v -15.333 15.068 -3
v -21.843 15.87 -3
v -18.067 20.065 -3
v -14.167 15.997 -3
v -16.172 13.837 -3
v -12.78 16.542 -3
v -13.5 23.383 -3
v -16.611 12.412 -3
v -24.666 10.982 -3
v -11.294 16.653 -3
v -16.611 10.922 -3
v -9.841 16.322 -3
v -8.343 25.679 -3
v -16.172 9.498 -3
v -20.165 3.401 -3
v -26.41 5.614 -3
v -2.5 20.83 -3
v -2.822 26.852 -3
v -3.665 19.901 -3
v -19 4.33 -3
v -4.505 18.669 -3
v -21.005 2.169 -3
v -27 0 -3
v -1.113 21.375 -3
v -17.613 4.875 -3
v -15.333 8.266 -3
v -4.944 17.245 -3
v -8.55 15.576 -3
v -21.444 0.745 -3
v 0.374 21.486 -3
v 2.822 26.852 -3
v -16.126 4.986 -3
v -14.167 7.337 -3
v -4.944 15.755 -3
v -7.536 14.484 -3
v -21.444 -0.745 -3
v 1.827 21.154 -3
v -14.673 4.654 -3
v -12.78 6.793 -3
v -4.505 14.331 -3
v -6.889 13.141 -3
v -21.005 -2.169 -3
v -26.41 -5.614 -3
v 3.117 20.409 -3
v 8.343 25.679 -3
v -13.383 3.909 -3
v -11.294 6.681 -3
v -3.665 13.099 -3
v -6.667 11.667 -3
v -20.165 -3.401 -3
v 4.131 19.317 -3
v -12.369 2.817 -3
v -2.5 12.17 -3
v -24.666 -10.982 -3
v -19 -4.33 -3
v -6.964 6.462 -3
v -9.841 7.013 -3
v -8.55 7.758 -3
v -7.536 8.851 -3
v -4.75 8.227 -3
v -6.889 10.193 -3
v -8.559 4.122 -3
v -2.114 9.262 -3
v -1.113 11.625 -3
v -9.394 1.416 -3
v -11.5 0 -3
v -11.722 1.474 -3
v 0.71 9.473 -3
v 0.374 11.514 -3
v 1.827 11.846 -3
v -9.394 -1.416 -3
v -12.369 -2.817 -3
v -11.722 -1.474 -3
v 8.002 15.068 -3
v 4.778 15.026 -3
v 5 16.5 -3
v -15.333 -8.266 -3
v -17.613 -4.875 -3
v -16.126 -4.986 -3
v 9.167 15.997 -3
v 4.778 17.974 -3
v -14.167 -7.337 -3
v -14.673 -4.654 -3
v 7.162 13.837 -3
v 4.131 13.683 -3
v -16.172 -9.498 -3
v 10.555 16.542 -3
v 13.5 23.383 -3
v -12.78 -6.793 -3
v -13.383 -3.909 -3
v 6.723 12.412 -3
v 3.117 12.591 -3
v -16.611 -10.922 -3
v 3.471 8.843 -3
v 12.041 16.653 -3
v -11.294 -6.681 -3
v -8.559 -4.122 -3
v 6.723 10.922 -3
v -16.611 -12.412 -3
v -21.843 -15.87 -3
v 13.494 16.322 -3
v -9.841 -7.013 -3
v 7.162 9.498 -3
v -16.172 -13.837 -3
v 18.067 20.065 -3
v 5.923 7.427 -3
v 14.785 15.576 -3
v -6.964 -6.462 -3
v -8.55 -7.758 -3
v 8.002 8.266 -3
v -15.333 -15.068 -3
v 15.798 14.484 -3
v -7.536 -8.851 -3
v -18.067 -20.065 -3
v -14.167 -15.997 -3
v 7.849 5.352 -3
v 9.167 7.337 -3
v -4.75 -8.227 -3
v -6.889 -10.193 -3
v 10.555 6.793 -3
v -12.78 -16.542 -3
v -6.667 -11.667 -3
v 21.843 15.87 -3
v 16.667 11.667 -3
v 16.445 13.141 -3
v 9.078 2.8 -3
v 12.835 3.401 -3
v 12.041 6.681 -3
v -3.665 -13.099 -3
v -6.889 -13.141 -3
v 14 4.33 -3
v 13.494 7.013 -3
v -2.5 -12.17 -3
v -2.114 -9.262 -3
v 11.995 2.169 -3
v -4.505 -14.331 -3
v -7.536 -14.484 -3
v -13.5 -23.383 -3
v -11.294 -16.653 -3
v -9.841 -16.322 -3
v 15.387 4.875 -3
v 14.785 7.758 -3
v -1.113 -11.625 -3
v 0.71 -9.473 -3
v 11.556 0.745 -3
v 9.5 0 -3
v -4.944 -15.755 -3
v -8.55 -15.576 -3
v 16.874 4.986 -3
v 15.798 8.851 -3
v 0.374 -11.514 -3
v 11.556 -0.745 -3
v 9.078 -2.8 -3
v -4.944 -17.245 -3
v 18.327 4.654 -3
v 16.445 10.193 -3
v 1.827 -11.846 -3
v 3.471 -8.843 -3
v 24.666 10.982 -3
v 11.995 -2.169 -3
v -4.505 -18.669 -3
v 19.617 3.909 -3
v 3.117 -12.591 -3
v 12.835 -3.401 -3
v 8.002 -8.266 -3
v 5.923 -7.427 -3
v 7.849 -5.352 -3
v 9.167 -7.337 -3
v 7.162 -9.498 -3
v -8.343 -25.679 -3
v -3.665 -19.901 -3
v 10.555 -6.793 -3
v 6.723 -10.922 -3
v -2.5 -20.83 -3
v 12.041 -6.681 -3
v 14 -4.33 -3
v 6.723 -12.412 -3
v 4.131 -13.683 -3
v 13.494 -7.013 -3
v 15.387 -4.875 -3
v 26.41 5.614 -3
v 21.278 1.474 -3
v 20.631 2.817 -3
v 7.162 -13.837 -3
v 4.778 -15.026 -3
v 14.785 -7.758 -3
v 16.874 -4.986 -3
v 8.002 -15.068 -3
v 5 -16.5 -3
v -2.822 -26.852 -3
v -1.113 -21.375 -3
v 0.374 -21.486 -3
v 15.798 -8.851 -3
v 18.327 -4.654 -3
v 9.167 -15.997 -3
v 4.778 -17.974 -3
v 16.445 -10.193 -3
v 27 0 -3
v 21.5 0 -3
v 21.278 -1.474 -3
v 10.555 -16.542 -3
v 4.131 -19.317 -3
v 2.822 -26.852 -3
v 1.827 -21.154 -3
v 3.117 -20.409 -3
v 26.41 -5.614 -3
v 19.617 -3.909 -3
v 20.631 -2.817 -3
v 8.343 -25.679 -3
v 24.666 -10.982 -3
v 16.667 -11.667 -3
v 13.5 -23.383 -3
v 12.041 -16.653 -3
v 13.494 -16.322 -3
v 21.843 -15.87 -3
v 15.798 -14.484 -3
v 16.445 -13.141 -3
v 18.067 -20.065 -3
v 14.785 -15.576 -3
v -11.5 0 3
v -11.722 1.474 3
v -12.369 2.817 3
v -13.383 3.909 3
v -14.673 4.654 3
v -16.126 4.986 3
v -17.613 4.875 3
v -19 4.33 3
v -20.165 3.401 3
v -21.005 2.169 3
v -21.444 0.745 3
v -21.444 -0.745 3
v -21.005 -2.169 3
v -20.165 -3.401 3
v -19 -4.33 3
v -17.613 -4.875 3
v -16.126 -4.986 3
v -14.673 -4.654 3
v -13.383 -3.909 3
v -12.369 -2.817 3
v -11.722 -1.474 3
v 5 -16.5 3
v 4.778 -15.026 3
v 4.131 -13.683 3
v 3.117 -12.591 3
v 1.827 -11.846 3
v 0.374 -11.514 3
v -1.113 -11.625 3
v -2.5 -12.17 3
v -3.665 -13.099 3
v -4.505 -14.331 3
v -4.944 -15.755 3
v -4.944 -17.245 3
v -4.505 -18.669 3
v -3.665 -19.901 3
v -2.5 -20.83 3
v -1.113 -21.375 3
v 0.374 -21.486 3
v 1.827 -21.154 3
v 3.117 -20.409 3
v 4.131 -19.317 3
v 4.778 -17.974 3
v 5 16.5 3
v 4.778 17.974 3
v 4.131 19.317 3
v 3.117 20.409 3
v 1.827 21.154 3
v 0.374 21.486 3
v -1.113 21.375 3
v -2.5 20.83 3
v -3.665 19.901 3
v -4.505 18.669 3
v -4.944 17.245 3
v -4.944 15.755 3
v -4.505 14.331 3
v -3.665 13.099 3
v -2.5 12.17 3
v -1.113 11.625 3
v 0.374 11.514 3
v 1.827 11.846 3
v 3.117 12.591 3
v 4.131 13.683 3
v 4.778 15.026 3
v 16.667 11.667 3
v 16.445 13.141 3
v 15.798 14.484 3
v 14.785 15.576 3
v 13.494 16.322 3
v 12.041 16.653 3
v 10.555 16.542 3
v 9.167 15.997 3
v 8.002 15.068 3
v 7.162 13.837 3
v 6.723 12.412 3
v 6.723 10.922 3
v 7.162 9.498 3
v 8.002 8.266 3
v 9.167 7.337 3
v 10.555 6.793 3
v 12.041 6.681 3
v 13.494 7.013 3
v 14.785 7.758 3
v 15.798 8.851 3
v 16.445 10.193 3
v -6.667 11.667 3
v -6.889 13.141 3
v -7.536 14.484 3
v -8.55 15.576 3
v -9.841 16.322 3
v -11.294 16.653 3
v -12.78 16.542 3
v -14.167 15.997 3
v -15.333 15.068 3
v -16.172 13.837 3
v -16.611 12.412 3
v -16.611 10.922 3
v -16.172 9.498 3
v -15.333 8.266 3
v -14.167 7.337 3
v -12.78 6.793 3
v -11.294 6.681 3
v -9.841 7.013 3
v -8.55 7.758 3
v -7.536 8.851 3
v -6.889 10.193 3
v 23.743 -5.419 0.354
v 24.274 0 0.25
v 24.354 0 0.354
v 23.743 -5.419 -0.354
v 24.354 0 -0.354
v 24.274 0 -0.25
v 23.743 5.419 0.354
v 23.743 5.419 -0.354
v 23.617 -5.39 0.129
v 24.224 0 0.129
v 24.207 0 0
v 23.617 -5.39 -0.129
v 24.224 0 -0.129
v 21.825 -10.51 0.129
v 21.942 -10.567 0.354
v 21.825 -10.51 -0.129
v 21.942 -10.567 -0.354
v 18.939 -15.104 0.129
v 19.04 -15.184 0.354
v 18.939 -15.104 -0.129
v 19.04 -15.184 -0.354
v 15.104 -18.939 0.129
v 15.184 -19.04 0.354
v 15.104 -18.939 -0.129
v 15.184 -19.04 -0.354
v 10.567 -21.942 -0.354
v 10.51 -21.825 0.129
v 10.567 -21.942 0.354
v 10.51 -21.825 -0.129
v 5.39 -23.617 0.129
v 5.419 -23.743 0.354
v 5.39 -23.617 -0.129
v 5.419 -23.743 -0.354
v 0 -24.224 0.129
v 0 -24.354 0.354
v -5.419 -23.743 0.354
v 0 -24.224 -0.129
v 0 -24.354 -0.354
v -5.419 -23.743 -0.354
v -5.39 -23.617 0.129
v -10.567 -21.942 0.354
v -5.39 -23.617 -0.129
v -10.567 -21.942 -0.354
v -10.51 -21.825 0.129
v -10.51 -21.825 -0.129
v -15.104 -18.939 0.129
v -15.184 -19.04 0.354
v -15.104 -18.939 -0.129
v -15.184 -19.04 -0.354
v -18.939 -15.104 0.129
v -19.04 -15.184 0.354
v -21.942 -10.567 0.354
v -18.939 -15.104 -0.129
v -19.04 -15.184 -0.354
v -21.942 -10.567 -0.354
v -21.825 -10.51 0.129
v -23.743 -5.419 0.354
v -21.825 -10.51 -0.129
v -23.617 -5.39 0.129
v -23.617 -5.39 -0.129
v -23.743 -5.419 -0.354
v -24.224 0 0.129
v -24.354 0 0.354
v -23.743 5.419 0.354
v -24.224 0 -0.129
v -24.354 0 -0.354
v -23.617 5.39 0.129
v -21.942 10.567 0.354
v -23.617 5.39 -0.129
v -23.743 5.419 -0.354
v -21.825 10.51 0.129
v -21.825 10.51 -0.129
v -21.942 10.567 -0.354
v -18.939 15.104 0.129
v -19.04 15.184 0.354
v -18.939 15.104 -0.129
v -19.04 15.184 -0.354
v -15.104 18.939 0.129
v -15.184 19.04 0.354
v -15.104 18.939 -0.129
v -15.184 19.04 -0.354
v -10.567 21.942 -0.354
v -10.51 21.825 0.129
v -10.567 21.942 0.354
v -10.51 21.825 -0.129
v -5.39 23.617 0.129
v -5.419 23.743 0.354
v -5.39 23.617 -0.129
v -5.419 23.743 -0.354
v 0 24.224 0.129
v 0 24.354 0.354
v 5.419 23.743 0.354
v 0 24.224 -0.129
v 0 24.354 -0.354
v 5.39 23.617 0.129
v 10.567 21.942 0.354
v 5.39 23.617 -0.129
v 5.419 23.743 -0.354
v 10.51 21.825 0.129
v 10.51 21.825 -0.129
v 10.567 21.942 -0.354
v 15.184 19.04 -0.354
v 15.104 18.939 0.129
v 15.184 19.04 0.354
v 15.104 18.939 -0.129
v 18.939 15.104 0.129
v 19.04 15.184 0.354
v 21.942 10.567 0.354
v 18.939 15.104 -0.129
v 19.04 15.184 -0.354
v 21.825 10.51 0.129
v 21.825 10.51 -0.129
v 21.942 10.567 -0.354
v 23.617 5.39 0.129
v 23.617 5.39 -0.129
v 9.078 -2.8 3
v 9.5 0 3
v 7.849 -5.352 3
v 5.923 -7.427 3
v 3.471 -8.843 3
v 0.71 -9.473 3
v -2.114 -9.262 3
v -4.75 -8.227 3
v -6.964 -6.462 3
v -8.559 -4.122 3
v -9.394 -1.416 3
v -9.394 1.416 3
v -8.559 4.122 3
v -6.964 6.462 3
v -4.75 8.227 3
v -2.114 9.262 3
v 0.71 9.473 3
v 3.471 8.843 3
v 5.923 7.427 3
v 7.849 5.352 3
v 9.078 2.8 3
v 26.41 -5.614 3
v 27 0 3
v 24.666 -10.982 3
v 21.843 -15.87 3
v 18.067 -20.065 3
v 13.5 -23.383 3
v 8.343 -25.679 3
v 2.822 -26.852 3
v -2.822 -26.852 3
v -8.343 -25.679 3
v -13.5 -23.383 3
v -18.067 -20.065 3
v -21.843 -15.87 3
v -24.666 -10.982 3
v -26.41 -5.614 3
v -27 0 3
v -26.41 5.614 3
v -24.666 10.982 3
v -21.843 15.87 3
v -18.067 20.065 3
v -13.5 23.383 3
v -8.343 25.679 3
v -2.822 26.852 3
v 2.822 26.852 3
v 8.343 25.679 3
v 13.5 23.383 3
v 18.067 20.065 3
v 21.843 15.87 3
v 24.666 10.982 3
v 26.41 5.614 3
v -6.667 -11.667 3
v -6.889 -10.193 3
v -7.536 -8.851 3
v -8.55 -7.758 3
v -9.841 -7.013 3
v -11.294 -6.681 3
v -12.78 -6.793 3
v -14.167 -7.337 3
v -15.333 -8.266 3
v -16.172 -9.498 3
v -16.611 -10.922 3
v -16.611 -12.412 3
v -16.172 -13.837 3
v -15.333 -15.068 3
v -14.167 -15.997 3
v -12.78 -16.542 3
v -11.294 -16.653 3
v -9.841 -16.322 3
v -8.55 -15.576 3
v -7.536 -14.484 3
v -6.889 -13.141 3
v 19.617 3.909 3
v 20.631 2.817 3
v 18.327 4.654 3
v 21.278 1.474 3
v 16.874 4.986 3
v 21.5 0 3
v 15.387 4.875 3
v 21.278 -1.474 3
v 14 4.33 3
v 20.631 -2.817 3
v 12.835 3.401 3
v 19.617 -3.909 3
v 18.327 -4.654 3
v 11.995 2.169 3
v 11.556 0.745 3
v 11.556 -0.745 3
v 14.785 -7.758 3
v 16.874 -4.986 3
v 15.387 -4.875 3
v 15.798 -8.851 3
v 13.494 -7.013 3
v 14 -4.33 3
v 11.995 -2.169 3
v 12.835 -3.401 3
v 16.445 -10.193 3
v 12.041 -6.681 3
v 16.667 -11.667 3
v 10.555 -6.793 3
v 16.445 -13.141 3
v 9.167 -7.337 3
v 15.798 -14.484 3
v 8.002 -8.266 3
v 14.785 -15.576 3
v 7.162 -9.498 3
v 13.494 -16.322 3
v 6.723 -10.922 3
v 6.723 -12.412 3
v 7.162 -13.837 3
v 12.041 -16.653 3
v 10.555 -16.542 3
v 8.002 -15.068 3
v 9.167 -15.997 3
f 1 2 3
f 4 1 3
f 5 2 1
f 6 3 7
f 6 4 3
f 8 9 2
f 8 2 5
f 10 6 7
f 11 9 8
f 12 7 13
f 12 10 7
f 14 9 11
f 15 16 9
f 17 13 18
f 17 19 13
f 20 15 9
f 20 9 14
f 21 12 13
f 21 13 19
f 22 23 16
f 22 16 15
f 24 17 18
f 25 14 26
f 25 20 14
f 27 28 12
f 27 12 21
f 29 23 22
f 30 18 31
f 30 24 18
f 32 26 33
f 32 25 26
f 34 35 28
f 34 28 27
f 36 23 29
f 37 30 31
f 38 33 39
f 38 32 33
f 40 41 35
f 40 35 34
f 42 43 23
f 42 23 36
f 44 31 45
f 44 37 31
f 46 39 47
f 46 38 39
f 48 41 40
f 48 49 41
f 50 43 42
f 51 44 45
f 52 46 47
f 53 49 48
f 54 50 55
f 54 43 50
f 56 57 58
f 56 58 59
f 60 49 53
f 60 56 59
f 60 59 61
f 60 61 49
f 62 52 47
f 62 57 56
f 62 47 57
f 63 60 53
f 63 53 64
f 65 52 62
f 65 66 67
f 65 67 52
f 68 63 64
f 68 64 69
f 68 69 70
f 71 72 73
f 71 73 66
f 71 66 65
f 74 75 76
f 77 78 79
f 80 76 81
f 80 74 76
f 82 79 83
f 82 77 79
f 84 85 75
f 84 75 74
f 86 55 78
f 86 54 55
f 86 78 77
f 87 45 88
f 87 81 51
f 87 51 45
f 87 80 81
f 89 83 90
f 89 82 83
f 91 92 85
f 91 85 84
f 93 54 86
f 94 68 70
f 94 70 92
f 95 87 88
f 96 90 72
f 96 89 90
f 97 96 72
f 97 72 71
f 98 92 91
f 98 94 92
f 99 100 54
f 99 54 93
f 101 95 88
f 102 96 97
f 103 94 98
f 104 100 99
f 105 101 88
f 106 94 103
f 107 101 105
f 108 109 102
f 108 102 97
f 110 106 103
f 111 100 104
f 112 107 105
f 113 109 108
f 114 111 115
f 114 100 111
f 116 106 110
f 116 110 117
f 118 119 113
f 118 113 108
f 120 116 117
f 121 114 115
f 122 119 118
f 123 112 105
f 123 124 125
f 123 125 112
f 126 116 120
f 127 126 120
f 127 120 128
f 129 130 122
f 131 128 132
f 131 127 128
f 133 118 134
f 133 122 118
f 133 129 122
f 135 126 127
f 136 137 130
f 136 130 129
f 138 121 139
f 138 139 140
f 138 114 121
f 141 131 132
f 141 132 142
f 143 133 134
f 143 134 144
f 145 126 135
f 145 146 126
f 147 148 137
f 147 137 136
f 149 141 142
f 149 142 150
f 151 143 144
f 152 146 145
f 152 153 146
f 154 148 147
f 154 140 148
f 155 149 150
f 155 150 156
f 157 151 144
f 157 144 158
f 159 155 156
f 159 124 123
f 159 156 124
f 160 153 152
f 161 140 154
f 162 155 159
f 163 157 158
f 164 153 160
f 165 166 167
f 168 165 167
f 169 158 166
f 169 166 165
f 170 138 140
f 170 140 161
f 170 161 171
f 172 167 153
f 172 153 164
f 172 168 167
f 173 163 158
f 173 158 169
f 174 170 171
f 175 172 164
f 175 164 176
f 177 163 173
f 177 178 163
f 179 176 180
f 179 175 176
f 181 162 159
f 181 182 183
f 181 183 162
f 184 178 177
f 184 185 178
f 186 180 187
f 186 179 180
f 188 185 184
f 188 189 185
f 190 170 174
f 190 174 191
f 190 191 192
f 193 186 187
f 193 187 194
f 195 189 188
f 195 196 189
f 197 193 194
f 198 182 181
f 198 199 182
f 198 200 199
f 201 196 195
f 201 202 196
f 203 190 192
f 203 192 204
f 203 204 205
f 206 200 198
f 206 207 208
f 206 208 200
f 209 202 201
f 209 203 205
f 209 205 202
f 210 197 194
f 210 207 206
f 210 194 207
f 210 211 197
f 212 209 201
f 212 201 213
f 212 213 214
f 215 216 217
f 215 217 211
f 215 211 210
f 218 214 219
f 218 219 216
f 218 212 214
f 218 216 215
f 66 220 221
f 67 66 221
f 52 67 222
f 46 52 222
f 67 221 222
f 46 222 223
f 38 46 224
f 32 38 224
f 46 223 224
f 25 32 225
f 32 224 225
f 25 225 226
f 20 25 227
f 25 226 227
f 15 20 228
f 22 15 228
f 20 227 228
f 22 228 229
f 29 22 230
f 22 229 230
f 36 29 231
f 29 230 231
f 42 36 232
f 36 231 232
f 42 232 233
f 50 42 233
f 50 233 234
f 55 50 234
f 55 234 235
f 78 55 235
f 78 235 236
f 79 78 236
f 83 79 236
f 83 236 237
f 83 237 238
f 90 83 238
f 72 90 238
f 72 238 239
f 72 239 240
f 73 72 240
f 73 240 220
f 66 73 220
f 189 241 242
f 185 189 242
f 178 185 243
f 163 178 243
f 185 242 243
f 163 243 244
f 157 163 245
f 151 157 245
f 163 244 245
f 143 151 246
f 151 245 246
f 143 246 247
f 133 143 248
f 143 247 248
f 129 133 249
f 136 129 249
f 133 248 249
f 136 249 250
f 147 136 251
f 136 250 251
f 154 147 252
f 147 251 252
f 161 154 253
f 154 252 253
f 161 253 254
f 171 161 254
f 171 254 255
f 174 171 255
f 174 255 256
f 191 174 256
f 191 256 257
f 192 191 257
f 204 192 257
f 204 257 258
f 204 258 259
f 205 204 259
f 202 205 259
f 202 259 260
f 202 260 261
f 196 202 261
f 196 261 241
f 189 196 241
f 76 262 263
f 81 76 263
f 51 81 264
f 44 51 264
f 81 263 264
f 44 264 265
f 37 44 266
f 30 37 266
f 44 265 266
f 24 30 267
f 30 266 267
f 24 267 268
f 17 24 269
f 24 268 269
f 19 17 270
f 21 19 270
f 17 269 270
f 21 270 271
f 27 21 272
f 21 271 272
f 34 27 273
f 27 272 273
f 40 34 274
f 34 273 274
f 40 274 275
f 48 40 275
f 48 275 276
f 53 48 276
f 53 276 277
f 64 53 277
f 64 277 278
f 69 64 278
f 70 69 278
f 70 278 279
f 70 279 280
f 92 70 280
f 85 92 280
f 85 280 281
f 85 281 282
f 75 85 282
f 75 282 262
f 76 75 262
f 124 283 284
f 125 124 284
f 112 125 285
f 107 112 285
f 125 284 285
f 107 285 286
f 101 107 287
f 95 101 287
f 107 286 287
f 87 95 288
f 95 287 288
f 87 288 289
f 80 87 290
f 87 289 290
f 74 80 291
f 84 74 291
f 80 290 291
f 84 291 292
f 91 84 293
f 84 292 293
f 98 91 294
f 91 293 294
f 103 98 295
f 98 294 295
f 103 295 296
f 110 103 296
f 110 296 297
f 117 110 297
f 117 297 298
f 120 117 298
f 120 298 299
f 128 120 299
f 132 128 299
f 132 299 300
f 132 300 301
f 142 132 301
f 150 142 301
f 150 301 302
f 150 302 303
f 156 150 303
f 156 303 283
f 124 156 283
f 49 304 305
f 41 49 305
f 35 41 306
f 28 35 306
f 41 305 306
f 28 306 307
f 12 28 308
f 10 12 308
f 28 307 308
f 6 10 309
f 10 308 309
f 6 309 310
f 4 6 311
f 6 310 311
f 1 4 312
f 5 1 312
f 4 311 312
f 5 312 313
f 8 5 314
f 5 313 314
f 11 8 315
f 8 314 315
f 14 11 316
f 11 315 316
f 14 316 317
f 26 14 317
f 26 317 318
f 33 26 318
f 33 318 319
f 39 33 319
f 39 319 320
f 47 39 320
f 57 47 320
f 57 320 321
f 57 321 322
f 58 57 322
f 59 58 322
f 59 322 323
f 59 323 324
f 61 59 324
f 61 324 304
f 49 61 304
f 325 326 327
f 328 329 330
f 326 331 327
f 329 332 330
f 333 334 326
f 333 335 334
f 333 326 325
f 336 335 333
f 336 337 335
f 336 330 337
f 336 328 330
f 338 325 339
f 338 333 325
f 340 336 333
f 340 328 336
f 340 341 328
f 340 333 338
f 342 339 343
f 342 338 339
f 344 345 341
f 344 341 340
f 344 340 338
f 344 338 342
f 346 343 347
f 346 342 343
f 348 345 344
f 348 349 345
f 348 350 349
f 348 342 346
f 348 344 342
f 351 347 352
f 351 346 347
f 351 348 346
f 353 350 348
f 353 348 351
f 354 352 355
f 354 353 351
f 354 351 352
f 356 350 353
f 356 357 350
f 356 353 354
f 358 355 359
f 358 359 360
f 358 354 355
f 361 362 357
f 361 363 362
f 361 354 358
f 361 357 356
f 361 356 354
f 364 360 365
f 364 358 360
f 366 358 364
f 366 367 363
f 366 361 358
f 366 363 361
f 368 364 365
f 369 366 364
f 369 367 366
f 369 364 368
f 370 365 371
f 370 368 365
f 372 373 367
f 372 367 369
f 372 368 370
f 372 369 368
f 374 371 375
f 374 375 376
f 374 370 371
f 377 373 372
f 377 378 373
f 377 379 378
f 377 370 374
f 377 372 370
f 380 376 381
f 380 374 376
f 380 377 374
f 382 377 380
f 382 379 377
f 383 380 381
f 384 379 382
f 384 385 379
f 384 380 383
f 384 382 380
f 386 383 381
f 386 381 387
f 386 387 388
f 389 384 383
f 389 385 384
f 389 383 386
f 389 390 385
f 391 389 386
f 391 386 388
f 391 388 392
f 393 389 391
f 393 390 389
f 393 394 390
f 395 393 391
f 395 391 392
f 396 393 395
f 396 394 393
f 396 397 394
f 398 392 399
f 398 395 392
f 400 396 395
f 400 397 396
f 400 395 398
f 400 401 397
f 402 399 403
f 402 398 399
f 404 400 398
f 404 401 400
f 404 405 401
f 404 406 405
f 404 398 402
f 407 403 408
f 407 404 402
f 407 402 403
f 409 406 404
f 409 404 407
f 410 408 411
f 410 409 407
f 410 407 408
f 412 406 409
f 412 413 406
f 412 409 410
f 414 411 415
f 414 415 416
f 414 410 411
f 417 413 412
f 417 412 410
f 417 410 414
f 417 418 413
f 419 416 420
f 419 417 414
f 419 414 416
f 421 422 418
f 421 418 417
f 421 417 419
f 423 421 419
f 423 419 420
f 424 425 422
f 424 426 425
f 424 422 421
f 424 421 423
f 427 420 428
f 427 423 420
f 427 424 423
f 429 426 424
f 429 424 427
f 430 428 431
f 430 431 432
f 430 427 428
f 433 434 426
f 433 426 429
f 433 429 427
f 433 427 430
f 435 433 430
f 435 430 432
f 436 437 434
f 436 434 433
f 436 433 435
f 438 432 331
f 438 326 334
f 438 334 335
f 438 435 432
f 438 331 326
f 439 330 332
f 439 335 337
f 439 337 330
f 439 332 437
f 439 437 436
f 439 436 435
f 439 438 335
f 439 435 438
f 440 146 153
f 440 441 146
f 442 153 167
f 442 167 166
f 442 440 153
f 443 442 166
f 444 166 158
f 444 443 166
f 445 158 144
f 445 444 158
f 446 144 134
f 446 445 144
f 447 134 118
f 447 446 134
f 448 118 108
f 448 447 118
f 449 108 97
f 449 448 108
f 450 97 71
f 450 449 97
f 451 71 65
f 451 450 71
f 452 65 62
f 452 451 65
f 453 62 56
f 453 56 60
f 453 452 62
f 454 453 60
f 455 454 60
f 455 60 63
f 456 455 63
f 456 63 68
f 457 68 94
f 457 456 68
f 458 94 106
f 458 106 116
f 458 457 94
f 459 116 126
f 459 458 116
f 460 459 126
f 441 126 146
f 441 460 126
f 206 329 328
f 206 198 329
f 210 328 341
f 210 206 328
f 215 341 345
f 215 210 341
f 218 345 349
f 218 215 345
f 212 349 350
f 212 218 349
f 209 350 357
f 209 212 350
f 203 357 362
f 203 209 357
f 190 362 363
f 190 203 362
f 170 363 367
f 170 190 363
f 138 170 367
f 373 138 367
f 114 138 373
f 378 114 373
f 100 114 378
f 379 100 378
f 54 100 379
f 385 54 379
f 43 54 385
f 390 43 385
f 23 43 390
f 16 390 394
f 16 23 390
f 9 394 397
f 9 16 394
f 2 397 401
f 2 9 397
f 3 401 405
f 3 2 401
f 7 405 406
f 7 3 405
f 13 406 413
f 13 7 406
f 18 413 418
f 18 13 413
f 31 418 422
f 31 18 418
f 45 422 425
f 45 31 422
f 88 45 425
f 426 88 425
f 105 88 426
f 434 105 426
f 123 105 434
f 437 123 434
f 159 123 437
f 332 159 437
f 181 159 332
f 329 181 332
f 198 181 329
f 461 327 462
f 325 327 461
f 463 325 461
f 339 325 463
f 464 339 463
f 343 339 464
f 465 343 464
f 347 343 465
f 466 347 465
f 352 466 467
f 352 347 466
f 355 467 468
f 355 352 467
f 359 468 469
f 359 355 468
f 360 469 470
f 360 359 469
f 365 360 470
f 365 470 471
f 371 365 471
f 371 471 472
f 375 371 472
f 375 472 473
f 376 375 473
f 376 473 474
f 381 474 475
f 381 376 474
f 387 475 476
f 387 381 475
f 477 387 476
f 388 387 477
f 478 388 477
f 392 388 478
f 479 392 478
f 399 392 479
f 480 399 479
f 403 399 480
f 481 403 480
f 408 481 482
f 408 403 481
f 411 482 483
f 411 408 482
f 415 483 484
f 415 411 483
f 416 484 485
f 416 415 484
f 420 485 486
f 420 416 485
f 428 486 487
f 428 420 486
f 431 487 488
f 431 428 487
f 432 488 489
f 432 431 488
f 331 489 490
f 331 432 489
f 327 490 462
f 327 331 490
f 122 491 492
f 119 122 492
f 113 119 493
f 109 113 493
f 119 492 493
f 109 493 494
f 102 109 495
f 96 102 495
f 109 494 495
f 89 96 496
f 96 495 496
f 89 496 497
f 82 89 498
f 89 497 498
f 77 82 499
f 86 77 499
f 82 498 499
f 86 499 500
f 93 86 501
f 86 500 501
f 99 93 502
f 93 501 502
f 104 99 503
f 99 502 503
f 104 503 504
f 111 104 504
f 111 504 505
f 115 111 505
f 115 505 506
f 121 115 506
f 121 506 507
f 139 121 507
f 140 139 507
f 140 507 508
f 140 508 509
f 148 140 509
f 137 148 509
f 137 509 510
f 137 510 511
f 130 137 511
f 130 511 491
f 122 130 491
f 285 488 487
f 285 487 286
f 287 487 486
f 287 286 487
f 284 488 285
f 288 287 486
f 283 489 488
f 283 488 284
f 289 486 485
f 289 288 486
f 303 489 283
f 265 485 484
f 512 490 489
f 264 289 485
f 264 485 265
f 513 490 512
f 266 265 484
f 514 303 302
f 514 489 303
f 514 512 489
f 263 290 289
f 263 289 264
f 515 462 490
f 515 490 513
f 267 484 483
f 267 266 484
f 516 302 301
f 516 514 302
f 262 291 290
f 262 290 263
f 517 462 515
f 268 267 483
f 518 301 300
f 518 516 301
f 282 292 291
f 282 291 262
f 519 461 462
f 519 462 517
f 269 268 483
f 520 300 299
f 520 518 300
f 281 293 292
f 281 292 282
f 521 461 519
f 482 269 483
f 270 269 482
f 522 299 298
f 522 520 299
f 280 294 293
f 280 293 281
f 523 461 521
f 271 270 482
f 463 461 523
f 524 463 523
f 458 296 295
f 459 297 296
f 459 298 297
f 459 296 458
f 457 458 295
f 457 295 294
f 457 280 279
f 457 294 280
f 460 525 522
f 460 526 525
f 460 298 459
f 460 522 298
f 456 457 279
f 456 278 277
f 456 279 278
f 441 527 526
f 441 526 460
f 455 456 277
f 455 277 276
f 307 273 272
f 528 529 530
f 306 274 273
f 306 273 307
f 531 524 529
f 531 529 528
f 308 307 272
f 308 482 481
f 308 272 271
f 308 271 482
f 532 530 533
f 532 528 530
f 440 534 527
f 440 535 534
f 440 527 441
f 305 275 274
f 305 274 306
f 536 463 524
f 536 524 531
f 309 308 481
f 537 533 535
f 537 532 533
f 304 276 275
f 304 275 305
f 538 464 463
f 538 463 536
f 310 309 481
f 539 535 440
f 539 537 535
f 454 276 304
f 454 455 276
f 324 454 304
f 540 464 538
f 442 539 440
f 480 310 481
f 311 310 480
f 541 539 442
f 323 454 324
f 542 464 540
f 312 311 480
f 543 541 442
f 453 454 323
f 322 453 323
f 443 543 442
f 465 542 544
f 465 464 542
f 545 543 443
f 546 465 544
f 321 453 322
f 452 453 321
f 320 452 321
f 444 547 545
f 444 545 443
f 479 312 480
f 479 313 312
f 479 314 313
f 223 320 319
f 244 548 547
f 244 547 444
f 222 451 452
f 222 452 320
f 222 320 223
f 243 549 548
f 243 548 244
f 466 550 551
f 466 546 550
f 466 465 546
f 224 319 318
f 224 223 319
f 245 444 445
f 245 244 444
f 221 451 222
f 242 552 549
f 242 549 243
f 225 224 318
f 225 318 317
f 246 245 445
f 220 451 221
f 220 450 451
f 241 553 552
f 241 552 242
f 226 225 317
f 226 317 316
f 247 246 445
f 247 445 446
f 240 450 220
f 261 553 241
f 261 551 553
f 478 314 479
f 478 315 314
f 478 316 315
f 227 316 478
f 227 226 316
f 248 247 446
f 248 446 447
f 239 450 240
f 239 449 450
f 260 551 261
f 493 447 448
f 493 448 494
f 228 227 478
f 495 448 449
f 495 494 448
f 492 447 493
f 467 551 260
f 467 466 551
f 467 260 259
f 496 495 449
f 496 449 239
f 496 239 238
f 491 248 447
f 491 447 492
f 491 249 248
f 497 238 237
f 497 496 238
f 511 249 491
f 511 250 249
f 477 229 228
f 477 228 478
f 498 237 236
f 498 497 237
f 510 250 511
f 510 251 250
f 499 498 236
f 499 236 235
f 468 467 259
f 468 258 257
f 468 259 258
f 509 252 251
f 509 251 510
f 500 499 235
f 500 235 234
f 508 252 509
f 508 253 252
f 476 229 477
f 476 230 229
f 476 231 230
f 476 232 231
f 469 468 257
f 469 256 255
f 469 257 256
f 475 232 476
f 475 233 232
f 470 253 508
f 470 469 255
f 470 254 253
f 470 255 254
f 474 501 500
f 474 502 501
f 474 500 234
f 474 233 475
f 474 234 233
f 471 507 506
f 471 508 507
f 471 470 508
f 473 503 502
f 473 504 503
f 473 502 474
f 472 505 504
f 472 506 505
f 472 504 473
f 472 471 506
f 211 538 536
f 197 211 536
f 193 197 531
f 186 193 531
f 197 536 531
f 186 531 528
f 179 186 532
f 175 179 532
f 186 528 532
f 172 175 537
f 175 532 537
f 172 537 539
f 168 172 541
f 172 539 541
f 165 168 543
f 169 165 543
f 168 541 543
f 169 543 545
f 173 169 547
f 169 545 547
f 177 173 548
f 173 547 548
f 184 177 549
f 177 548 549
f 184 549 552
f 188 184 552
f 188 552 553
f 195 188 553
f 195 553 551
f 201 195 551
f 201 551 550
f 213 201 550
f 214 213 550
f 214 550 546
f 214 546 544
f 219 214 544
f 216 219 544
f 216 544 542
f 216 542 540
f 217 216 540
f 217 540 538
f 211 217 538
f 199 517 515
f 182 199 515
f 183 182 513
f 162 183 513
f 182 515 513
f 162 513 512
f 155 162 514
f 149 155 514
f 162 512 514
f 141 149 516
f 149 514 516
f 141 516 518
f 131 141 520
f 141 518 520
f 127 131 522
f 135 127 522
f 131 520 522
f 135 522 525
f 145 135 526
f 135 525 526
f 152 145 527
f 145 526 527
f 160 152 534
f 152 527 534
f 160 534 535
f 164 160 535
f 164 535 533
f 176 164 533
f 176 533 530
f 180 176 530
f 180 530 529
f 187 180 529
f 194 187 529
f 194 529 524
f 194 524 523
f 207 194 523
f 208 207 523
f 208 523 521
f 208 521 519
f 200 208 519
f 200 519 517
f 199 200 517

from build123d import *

# Parameters (mm, degrees)
SKETCH_6_R          = 5
CUT_EXTRUDE_2_DEPTH = 10


with BuildPart() as part:
    # 草图2 → 旋转1 (revolve)
    with BuildSketch(Plane(origin=(0, 0, 0), x_dir=(1, 0, 0), z_dir=(0, 1, 0))):
        with BuildLine():
            Line((9.5, 3), (9.5, -3))
            Line((9.5, -3), (27, -3))
            Line((27, -3), (24.353553391, -0.353553391))
            ThreePointArc((24.353553391, -0.353553391), (24.207106781, 0), (24.353553391, 0.353553391))
            Line((24.353553391, 0.353553391), (27, 3))
            Line((27, 3), (9.5, 3))
        make_face()
    revolve(axis=Axis((0, 0, 0), (0, 0, -1)))

    # 草图6 → 切除-拉伸2 (cut)
    with BuildSketch(Plane.XY.offset(3)):
        with Locations((16.5, 0)):
            Circle(SKETCH_6_R)
        with Locations((11.66726189, -11.66726189)):
            Circle(SKETCH_6_R)
        with Locations((0, -16.5)):
            Circle(SKETCH_6_R)
        with Locations((-11.66726189, -11.66726189)):
            Circle(SKETCH_6_R)
        with Locations((-16.5, 0)):
            Circle(SKETCH_6_R)
        with Locations((-11.66726189, 11.66726189)):
            Circle(SKETCH_6_R)
        with Locations((0, 16.5)):
            Circle(SKETCH_6_R)
        with Locations((11.66726189, 11.66726189)):
            Circle(SKETCH_6_R)
    extrude(amount=-CUT_EXTRUDE_2_DEPTH, mode=Mode.SUBTRACT)


solid = part.part
